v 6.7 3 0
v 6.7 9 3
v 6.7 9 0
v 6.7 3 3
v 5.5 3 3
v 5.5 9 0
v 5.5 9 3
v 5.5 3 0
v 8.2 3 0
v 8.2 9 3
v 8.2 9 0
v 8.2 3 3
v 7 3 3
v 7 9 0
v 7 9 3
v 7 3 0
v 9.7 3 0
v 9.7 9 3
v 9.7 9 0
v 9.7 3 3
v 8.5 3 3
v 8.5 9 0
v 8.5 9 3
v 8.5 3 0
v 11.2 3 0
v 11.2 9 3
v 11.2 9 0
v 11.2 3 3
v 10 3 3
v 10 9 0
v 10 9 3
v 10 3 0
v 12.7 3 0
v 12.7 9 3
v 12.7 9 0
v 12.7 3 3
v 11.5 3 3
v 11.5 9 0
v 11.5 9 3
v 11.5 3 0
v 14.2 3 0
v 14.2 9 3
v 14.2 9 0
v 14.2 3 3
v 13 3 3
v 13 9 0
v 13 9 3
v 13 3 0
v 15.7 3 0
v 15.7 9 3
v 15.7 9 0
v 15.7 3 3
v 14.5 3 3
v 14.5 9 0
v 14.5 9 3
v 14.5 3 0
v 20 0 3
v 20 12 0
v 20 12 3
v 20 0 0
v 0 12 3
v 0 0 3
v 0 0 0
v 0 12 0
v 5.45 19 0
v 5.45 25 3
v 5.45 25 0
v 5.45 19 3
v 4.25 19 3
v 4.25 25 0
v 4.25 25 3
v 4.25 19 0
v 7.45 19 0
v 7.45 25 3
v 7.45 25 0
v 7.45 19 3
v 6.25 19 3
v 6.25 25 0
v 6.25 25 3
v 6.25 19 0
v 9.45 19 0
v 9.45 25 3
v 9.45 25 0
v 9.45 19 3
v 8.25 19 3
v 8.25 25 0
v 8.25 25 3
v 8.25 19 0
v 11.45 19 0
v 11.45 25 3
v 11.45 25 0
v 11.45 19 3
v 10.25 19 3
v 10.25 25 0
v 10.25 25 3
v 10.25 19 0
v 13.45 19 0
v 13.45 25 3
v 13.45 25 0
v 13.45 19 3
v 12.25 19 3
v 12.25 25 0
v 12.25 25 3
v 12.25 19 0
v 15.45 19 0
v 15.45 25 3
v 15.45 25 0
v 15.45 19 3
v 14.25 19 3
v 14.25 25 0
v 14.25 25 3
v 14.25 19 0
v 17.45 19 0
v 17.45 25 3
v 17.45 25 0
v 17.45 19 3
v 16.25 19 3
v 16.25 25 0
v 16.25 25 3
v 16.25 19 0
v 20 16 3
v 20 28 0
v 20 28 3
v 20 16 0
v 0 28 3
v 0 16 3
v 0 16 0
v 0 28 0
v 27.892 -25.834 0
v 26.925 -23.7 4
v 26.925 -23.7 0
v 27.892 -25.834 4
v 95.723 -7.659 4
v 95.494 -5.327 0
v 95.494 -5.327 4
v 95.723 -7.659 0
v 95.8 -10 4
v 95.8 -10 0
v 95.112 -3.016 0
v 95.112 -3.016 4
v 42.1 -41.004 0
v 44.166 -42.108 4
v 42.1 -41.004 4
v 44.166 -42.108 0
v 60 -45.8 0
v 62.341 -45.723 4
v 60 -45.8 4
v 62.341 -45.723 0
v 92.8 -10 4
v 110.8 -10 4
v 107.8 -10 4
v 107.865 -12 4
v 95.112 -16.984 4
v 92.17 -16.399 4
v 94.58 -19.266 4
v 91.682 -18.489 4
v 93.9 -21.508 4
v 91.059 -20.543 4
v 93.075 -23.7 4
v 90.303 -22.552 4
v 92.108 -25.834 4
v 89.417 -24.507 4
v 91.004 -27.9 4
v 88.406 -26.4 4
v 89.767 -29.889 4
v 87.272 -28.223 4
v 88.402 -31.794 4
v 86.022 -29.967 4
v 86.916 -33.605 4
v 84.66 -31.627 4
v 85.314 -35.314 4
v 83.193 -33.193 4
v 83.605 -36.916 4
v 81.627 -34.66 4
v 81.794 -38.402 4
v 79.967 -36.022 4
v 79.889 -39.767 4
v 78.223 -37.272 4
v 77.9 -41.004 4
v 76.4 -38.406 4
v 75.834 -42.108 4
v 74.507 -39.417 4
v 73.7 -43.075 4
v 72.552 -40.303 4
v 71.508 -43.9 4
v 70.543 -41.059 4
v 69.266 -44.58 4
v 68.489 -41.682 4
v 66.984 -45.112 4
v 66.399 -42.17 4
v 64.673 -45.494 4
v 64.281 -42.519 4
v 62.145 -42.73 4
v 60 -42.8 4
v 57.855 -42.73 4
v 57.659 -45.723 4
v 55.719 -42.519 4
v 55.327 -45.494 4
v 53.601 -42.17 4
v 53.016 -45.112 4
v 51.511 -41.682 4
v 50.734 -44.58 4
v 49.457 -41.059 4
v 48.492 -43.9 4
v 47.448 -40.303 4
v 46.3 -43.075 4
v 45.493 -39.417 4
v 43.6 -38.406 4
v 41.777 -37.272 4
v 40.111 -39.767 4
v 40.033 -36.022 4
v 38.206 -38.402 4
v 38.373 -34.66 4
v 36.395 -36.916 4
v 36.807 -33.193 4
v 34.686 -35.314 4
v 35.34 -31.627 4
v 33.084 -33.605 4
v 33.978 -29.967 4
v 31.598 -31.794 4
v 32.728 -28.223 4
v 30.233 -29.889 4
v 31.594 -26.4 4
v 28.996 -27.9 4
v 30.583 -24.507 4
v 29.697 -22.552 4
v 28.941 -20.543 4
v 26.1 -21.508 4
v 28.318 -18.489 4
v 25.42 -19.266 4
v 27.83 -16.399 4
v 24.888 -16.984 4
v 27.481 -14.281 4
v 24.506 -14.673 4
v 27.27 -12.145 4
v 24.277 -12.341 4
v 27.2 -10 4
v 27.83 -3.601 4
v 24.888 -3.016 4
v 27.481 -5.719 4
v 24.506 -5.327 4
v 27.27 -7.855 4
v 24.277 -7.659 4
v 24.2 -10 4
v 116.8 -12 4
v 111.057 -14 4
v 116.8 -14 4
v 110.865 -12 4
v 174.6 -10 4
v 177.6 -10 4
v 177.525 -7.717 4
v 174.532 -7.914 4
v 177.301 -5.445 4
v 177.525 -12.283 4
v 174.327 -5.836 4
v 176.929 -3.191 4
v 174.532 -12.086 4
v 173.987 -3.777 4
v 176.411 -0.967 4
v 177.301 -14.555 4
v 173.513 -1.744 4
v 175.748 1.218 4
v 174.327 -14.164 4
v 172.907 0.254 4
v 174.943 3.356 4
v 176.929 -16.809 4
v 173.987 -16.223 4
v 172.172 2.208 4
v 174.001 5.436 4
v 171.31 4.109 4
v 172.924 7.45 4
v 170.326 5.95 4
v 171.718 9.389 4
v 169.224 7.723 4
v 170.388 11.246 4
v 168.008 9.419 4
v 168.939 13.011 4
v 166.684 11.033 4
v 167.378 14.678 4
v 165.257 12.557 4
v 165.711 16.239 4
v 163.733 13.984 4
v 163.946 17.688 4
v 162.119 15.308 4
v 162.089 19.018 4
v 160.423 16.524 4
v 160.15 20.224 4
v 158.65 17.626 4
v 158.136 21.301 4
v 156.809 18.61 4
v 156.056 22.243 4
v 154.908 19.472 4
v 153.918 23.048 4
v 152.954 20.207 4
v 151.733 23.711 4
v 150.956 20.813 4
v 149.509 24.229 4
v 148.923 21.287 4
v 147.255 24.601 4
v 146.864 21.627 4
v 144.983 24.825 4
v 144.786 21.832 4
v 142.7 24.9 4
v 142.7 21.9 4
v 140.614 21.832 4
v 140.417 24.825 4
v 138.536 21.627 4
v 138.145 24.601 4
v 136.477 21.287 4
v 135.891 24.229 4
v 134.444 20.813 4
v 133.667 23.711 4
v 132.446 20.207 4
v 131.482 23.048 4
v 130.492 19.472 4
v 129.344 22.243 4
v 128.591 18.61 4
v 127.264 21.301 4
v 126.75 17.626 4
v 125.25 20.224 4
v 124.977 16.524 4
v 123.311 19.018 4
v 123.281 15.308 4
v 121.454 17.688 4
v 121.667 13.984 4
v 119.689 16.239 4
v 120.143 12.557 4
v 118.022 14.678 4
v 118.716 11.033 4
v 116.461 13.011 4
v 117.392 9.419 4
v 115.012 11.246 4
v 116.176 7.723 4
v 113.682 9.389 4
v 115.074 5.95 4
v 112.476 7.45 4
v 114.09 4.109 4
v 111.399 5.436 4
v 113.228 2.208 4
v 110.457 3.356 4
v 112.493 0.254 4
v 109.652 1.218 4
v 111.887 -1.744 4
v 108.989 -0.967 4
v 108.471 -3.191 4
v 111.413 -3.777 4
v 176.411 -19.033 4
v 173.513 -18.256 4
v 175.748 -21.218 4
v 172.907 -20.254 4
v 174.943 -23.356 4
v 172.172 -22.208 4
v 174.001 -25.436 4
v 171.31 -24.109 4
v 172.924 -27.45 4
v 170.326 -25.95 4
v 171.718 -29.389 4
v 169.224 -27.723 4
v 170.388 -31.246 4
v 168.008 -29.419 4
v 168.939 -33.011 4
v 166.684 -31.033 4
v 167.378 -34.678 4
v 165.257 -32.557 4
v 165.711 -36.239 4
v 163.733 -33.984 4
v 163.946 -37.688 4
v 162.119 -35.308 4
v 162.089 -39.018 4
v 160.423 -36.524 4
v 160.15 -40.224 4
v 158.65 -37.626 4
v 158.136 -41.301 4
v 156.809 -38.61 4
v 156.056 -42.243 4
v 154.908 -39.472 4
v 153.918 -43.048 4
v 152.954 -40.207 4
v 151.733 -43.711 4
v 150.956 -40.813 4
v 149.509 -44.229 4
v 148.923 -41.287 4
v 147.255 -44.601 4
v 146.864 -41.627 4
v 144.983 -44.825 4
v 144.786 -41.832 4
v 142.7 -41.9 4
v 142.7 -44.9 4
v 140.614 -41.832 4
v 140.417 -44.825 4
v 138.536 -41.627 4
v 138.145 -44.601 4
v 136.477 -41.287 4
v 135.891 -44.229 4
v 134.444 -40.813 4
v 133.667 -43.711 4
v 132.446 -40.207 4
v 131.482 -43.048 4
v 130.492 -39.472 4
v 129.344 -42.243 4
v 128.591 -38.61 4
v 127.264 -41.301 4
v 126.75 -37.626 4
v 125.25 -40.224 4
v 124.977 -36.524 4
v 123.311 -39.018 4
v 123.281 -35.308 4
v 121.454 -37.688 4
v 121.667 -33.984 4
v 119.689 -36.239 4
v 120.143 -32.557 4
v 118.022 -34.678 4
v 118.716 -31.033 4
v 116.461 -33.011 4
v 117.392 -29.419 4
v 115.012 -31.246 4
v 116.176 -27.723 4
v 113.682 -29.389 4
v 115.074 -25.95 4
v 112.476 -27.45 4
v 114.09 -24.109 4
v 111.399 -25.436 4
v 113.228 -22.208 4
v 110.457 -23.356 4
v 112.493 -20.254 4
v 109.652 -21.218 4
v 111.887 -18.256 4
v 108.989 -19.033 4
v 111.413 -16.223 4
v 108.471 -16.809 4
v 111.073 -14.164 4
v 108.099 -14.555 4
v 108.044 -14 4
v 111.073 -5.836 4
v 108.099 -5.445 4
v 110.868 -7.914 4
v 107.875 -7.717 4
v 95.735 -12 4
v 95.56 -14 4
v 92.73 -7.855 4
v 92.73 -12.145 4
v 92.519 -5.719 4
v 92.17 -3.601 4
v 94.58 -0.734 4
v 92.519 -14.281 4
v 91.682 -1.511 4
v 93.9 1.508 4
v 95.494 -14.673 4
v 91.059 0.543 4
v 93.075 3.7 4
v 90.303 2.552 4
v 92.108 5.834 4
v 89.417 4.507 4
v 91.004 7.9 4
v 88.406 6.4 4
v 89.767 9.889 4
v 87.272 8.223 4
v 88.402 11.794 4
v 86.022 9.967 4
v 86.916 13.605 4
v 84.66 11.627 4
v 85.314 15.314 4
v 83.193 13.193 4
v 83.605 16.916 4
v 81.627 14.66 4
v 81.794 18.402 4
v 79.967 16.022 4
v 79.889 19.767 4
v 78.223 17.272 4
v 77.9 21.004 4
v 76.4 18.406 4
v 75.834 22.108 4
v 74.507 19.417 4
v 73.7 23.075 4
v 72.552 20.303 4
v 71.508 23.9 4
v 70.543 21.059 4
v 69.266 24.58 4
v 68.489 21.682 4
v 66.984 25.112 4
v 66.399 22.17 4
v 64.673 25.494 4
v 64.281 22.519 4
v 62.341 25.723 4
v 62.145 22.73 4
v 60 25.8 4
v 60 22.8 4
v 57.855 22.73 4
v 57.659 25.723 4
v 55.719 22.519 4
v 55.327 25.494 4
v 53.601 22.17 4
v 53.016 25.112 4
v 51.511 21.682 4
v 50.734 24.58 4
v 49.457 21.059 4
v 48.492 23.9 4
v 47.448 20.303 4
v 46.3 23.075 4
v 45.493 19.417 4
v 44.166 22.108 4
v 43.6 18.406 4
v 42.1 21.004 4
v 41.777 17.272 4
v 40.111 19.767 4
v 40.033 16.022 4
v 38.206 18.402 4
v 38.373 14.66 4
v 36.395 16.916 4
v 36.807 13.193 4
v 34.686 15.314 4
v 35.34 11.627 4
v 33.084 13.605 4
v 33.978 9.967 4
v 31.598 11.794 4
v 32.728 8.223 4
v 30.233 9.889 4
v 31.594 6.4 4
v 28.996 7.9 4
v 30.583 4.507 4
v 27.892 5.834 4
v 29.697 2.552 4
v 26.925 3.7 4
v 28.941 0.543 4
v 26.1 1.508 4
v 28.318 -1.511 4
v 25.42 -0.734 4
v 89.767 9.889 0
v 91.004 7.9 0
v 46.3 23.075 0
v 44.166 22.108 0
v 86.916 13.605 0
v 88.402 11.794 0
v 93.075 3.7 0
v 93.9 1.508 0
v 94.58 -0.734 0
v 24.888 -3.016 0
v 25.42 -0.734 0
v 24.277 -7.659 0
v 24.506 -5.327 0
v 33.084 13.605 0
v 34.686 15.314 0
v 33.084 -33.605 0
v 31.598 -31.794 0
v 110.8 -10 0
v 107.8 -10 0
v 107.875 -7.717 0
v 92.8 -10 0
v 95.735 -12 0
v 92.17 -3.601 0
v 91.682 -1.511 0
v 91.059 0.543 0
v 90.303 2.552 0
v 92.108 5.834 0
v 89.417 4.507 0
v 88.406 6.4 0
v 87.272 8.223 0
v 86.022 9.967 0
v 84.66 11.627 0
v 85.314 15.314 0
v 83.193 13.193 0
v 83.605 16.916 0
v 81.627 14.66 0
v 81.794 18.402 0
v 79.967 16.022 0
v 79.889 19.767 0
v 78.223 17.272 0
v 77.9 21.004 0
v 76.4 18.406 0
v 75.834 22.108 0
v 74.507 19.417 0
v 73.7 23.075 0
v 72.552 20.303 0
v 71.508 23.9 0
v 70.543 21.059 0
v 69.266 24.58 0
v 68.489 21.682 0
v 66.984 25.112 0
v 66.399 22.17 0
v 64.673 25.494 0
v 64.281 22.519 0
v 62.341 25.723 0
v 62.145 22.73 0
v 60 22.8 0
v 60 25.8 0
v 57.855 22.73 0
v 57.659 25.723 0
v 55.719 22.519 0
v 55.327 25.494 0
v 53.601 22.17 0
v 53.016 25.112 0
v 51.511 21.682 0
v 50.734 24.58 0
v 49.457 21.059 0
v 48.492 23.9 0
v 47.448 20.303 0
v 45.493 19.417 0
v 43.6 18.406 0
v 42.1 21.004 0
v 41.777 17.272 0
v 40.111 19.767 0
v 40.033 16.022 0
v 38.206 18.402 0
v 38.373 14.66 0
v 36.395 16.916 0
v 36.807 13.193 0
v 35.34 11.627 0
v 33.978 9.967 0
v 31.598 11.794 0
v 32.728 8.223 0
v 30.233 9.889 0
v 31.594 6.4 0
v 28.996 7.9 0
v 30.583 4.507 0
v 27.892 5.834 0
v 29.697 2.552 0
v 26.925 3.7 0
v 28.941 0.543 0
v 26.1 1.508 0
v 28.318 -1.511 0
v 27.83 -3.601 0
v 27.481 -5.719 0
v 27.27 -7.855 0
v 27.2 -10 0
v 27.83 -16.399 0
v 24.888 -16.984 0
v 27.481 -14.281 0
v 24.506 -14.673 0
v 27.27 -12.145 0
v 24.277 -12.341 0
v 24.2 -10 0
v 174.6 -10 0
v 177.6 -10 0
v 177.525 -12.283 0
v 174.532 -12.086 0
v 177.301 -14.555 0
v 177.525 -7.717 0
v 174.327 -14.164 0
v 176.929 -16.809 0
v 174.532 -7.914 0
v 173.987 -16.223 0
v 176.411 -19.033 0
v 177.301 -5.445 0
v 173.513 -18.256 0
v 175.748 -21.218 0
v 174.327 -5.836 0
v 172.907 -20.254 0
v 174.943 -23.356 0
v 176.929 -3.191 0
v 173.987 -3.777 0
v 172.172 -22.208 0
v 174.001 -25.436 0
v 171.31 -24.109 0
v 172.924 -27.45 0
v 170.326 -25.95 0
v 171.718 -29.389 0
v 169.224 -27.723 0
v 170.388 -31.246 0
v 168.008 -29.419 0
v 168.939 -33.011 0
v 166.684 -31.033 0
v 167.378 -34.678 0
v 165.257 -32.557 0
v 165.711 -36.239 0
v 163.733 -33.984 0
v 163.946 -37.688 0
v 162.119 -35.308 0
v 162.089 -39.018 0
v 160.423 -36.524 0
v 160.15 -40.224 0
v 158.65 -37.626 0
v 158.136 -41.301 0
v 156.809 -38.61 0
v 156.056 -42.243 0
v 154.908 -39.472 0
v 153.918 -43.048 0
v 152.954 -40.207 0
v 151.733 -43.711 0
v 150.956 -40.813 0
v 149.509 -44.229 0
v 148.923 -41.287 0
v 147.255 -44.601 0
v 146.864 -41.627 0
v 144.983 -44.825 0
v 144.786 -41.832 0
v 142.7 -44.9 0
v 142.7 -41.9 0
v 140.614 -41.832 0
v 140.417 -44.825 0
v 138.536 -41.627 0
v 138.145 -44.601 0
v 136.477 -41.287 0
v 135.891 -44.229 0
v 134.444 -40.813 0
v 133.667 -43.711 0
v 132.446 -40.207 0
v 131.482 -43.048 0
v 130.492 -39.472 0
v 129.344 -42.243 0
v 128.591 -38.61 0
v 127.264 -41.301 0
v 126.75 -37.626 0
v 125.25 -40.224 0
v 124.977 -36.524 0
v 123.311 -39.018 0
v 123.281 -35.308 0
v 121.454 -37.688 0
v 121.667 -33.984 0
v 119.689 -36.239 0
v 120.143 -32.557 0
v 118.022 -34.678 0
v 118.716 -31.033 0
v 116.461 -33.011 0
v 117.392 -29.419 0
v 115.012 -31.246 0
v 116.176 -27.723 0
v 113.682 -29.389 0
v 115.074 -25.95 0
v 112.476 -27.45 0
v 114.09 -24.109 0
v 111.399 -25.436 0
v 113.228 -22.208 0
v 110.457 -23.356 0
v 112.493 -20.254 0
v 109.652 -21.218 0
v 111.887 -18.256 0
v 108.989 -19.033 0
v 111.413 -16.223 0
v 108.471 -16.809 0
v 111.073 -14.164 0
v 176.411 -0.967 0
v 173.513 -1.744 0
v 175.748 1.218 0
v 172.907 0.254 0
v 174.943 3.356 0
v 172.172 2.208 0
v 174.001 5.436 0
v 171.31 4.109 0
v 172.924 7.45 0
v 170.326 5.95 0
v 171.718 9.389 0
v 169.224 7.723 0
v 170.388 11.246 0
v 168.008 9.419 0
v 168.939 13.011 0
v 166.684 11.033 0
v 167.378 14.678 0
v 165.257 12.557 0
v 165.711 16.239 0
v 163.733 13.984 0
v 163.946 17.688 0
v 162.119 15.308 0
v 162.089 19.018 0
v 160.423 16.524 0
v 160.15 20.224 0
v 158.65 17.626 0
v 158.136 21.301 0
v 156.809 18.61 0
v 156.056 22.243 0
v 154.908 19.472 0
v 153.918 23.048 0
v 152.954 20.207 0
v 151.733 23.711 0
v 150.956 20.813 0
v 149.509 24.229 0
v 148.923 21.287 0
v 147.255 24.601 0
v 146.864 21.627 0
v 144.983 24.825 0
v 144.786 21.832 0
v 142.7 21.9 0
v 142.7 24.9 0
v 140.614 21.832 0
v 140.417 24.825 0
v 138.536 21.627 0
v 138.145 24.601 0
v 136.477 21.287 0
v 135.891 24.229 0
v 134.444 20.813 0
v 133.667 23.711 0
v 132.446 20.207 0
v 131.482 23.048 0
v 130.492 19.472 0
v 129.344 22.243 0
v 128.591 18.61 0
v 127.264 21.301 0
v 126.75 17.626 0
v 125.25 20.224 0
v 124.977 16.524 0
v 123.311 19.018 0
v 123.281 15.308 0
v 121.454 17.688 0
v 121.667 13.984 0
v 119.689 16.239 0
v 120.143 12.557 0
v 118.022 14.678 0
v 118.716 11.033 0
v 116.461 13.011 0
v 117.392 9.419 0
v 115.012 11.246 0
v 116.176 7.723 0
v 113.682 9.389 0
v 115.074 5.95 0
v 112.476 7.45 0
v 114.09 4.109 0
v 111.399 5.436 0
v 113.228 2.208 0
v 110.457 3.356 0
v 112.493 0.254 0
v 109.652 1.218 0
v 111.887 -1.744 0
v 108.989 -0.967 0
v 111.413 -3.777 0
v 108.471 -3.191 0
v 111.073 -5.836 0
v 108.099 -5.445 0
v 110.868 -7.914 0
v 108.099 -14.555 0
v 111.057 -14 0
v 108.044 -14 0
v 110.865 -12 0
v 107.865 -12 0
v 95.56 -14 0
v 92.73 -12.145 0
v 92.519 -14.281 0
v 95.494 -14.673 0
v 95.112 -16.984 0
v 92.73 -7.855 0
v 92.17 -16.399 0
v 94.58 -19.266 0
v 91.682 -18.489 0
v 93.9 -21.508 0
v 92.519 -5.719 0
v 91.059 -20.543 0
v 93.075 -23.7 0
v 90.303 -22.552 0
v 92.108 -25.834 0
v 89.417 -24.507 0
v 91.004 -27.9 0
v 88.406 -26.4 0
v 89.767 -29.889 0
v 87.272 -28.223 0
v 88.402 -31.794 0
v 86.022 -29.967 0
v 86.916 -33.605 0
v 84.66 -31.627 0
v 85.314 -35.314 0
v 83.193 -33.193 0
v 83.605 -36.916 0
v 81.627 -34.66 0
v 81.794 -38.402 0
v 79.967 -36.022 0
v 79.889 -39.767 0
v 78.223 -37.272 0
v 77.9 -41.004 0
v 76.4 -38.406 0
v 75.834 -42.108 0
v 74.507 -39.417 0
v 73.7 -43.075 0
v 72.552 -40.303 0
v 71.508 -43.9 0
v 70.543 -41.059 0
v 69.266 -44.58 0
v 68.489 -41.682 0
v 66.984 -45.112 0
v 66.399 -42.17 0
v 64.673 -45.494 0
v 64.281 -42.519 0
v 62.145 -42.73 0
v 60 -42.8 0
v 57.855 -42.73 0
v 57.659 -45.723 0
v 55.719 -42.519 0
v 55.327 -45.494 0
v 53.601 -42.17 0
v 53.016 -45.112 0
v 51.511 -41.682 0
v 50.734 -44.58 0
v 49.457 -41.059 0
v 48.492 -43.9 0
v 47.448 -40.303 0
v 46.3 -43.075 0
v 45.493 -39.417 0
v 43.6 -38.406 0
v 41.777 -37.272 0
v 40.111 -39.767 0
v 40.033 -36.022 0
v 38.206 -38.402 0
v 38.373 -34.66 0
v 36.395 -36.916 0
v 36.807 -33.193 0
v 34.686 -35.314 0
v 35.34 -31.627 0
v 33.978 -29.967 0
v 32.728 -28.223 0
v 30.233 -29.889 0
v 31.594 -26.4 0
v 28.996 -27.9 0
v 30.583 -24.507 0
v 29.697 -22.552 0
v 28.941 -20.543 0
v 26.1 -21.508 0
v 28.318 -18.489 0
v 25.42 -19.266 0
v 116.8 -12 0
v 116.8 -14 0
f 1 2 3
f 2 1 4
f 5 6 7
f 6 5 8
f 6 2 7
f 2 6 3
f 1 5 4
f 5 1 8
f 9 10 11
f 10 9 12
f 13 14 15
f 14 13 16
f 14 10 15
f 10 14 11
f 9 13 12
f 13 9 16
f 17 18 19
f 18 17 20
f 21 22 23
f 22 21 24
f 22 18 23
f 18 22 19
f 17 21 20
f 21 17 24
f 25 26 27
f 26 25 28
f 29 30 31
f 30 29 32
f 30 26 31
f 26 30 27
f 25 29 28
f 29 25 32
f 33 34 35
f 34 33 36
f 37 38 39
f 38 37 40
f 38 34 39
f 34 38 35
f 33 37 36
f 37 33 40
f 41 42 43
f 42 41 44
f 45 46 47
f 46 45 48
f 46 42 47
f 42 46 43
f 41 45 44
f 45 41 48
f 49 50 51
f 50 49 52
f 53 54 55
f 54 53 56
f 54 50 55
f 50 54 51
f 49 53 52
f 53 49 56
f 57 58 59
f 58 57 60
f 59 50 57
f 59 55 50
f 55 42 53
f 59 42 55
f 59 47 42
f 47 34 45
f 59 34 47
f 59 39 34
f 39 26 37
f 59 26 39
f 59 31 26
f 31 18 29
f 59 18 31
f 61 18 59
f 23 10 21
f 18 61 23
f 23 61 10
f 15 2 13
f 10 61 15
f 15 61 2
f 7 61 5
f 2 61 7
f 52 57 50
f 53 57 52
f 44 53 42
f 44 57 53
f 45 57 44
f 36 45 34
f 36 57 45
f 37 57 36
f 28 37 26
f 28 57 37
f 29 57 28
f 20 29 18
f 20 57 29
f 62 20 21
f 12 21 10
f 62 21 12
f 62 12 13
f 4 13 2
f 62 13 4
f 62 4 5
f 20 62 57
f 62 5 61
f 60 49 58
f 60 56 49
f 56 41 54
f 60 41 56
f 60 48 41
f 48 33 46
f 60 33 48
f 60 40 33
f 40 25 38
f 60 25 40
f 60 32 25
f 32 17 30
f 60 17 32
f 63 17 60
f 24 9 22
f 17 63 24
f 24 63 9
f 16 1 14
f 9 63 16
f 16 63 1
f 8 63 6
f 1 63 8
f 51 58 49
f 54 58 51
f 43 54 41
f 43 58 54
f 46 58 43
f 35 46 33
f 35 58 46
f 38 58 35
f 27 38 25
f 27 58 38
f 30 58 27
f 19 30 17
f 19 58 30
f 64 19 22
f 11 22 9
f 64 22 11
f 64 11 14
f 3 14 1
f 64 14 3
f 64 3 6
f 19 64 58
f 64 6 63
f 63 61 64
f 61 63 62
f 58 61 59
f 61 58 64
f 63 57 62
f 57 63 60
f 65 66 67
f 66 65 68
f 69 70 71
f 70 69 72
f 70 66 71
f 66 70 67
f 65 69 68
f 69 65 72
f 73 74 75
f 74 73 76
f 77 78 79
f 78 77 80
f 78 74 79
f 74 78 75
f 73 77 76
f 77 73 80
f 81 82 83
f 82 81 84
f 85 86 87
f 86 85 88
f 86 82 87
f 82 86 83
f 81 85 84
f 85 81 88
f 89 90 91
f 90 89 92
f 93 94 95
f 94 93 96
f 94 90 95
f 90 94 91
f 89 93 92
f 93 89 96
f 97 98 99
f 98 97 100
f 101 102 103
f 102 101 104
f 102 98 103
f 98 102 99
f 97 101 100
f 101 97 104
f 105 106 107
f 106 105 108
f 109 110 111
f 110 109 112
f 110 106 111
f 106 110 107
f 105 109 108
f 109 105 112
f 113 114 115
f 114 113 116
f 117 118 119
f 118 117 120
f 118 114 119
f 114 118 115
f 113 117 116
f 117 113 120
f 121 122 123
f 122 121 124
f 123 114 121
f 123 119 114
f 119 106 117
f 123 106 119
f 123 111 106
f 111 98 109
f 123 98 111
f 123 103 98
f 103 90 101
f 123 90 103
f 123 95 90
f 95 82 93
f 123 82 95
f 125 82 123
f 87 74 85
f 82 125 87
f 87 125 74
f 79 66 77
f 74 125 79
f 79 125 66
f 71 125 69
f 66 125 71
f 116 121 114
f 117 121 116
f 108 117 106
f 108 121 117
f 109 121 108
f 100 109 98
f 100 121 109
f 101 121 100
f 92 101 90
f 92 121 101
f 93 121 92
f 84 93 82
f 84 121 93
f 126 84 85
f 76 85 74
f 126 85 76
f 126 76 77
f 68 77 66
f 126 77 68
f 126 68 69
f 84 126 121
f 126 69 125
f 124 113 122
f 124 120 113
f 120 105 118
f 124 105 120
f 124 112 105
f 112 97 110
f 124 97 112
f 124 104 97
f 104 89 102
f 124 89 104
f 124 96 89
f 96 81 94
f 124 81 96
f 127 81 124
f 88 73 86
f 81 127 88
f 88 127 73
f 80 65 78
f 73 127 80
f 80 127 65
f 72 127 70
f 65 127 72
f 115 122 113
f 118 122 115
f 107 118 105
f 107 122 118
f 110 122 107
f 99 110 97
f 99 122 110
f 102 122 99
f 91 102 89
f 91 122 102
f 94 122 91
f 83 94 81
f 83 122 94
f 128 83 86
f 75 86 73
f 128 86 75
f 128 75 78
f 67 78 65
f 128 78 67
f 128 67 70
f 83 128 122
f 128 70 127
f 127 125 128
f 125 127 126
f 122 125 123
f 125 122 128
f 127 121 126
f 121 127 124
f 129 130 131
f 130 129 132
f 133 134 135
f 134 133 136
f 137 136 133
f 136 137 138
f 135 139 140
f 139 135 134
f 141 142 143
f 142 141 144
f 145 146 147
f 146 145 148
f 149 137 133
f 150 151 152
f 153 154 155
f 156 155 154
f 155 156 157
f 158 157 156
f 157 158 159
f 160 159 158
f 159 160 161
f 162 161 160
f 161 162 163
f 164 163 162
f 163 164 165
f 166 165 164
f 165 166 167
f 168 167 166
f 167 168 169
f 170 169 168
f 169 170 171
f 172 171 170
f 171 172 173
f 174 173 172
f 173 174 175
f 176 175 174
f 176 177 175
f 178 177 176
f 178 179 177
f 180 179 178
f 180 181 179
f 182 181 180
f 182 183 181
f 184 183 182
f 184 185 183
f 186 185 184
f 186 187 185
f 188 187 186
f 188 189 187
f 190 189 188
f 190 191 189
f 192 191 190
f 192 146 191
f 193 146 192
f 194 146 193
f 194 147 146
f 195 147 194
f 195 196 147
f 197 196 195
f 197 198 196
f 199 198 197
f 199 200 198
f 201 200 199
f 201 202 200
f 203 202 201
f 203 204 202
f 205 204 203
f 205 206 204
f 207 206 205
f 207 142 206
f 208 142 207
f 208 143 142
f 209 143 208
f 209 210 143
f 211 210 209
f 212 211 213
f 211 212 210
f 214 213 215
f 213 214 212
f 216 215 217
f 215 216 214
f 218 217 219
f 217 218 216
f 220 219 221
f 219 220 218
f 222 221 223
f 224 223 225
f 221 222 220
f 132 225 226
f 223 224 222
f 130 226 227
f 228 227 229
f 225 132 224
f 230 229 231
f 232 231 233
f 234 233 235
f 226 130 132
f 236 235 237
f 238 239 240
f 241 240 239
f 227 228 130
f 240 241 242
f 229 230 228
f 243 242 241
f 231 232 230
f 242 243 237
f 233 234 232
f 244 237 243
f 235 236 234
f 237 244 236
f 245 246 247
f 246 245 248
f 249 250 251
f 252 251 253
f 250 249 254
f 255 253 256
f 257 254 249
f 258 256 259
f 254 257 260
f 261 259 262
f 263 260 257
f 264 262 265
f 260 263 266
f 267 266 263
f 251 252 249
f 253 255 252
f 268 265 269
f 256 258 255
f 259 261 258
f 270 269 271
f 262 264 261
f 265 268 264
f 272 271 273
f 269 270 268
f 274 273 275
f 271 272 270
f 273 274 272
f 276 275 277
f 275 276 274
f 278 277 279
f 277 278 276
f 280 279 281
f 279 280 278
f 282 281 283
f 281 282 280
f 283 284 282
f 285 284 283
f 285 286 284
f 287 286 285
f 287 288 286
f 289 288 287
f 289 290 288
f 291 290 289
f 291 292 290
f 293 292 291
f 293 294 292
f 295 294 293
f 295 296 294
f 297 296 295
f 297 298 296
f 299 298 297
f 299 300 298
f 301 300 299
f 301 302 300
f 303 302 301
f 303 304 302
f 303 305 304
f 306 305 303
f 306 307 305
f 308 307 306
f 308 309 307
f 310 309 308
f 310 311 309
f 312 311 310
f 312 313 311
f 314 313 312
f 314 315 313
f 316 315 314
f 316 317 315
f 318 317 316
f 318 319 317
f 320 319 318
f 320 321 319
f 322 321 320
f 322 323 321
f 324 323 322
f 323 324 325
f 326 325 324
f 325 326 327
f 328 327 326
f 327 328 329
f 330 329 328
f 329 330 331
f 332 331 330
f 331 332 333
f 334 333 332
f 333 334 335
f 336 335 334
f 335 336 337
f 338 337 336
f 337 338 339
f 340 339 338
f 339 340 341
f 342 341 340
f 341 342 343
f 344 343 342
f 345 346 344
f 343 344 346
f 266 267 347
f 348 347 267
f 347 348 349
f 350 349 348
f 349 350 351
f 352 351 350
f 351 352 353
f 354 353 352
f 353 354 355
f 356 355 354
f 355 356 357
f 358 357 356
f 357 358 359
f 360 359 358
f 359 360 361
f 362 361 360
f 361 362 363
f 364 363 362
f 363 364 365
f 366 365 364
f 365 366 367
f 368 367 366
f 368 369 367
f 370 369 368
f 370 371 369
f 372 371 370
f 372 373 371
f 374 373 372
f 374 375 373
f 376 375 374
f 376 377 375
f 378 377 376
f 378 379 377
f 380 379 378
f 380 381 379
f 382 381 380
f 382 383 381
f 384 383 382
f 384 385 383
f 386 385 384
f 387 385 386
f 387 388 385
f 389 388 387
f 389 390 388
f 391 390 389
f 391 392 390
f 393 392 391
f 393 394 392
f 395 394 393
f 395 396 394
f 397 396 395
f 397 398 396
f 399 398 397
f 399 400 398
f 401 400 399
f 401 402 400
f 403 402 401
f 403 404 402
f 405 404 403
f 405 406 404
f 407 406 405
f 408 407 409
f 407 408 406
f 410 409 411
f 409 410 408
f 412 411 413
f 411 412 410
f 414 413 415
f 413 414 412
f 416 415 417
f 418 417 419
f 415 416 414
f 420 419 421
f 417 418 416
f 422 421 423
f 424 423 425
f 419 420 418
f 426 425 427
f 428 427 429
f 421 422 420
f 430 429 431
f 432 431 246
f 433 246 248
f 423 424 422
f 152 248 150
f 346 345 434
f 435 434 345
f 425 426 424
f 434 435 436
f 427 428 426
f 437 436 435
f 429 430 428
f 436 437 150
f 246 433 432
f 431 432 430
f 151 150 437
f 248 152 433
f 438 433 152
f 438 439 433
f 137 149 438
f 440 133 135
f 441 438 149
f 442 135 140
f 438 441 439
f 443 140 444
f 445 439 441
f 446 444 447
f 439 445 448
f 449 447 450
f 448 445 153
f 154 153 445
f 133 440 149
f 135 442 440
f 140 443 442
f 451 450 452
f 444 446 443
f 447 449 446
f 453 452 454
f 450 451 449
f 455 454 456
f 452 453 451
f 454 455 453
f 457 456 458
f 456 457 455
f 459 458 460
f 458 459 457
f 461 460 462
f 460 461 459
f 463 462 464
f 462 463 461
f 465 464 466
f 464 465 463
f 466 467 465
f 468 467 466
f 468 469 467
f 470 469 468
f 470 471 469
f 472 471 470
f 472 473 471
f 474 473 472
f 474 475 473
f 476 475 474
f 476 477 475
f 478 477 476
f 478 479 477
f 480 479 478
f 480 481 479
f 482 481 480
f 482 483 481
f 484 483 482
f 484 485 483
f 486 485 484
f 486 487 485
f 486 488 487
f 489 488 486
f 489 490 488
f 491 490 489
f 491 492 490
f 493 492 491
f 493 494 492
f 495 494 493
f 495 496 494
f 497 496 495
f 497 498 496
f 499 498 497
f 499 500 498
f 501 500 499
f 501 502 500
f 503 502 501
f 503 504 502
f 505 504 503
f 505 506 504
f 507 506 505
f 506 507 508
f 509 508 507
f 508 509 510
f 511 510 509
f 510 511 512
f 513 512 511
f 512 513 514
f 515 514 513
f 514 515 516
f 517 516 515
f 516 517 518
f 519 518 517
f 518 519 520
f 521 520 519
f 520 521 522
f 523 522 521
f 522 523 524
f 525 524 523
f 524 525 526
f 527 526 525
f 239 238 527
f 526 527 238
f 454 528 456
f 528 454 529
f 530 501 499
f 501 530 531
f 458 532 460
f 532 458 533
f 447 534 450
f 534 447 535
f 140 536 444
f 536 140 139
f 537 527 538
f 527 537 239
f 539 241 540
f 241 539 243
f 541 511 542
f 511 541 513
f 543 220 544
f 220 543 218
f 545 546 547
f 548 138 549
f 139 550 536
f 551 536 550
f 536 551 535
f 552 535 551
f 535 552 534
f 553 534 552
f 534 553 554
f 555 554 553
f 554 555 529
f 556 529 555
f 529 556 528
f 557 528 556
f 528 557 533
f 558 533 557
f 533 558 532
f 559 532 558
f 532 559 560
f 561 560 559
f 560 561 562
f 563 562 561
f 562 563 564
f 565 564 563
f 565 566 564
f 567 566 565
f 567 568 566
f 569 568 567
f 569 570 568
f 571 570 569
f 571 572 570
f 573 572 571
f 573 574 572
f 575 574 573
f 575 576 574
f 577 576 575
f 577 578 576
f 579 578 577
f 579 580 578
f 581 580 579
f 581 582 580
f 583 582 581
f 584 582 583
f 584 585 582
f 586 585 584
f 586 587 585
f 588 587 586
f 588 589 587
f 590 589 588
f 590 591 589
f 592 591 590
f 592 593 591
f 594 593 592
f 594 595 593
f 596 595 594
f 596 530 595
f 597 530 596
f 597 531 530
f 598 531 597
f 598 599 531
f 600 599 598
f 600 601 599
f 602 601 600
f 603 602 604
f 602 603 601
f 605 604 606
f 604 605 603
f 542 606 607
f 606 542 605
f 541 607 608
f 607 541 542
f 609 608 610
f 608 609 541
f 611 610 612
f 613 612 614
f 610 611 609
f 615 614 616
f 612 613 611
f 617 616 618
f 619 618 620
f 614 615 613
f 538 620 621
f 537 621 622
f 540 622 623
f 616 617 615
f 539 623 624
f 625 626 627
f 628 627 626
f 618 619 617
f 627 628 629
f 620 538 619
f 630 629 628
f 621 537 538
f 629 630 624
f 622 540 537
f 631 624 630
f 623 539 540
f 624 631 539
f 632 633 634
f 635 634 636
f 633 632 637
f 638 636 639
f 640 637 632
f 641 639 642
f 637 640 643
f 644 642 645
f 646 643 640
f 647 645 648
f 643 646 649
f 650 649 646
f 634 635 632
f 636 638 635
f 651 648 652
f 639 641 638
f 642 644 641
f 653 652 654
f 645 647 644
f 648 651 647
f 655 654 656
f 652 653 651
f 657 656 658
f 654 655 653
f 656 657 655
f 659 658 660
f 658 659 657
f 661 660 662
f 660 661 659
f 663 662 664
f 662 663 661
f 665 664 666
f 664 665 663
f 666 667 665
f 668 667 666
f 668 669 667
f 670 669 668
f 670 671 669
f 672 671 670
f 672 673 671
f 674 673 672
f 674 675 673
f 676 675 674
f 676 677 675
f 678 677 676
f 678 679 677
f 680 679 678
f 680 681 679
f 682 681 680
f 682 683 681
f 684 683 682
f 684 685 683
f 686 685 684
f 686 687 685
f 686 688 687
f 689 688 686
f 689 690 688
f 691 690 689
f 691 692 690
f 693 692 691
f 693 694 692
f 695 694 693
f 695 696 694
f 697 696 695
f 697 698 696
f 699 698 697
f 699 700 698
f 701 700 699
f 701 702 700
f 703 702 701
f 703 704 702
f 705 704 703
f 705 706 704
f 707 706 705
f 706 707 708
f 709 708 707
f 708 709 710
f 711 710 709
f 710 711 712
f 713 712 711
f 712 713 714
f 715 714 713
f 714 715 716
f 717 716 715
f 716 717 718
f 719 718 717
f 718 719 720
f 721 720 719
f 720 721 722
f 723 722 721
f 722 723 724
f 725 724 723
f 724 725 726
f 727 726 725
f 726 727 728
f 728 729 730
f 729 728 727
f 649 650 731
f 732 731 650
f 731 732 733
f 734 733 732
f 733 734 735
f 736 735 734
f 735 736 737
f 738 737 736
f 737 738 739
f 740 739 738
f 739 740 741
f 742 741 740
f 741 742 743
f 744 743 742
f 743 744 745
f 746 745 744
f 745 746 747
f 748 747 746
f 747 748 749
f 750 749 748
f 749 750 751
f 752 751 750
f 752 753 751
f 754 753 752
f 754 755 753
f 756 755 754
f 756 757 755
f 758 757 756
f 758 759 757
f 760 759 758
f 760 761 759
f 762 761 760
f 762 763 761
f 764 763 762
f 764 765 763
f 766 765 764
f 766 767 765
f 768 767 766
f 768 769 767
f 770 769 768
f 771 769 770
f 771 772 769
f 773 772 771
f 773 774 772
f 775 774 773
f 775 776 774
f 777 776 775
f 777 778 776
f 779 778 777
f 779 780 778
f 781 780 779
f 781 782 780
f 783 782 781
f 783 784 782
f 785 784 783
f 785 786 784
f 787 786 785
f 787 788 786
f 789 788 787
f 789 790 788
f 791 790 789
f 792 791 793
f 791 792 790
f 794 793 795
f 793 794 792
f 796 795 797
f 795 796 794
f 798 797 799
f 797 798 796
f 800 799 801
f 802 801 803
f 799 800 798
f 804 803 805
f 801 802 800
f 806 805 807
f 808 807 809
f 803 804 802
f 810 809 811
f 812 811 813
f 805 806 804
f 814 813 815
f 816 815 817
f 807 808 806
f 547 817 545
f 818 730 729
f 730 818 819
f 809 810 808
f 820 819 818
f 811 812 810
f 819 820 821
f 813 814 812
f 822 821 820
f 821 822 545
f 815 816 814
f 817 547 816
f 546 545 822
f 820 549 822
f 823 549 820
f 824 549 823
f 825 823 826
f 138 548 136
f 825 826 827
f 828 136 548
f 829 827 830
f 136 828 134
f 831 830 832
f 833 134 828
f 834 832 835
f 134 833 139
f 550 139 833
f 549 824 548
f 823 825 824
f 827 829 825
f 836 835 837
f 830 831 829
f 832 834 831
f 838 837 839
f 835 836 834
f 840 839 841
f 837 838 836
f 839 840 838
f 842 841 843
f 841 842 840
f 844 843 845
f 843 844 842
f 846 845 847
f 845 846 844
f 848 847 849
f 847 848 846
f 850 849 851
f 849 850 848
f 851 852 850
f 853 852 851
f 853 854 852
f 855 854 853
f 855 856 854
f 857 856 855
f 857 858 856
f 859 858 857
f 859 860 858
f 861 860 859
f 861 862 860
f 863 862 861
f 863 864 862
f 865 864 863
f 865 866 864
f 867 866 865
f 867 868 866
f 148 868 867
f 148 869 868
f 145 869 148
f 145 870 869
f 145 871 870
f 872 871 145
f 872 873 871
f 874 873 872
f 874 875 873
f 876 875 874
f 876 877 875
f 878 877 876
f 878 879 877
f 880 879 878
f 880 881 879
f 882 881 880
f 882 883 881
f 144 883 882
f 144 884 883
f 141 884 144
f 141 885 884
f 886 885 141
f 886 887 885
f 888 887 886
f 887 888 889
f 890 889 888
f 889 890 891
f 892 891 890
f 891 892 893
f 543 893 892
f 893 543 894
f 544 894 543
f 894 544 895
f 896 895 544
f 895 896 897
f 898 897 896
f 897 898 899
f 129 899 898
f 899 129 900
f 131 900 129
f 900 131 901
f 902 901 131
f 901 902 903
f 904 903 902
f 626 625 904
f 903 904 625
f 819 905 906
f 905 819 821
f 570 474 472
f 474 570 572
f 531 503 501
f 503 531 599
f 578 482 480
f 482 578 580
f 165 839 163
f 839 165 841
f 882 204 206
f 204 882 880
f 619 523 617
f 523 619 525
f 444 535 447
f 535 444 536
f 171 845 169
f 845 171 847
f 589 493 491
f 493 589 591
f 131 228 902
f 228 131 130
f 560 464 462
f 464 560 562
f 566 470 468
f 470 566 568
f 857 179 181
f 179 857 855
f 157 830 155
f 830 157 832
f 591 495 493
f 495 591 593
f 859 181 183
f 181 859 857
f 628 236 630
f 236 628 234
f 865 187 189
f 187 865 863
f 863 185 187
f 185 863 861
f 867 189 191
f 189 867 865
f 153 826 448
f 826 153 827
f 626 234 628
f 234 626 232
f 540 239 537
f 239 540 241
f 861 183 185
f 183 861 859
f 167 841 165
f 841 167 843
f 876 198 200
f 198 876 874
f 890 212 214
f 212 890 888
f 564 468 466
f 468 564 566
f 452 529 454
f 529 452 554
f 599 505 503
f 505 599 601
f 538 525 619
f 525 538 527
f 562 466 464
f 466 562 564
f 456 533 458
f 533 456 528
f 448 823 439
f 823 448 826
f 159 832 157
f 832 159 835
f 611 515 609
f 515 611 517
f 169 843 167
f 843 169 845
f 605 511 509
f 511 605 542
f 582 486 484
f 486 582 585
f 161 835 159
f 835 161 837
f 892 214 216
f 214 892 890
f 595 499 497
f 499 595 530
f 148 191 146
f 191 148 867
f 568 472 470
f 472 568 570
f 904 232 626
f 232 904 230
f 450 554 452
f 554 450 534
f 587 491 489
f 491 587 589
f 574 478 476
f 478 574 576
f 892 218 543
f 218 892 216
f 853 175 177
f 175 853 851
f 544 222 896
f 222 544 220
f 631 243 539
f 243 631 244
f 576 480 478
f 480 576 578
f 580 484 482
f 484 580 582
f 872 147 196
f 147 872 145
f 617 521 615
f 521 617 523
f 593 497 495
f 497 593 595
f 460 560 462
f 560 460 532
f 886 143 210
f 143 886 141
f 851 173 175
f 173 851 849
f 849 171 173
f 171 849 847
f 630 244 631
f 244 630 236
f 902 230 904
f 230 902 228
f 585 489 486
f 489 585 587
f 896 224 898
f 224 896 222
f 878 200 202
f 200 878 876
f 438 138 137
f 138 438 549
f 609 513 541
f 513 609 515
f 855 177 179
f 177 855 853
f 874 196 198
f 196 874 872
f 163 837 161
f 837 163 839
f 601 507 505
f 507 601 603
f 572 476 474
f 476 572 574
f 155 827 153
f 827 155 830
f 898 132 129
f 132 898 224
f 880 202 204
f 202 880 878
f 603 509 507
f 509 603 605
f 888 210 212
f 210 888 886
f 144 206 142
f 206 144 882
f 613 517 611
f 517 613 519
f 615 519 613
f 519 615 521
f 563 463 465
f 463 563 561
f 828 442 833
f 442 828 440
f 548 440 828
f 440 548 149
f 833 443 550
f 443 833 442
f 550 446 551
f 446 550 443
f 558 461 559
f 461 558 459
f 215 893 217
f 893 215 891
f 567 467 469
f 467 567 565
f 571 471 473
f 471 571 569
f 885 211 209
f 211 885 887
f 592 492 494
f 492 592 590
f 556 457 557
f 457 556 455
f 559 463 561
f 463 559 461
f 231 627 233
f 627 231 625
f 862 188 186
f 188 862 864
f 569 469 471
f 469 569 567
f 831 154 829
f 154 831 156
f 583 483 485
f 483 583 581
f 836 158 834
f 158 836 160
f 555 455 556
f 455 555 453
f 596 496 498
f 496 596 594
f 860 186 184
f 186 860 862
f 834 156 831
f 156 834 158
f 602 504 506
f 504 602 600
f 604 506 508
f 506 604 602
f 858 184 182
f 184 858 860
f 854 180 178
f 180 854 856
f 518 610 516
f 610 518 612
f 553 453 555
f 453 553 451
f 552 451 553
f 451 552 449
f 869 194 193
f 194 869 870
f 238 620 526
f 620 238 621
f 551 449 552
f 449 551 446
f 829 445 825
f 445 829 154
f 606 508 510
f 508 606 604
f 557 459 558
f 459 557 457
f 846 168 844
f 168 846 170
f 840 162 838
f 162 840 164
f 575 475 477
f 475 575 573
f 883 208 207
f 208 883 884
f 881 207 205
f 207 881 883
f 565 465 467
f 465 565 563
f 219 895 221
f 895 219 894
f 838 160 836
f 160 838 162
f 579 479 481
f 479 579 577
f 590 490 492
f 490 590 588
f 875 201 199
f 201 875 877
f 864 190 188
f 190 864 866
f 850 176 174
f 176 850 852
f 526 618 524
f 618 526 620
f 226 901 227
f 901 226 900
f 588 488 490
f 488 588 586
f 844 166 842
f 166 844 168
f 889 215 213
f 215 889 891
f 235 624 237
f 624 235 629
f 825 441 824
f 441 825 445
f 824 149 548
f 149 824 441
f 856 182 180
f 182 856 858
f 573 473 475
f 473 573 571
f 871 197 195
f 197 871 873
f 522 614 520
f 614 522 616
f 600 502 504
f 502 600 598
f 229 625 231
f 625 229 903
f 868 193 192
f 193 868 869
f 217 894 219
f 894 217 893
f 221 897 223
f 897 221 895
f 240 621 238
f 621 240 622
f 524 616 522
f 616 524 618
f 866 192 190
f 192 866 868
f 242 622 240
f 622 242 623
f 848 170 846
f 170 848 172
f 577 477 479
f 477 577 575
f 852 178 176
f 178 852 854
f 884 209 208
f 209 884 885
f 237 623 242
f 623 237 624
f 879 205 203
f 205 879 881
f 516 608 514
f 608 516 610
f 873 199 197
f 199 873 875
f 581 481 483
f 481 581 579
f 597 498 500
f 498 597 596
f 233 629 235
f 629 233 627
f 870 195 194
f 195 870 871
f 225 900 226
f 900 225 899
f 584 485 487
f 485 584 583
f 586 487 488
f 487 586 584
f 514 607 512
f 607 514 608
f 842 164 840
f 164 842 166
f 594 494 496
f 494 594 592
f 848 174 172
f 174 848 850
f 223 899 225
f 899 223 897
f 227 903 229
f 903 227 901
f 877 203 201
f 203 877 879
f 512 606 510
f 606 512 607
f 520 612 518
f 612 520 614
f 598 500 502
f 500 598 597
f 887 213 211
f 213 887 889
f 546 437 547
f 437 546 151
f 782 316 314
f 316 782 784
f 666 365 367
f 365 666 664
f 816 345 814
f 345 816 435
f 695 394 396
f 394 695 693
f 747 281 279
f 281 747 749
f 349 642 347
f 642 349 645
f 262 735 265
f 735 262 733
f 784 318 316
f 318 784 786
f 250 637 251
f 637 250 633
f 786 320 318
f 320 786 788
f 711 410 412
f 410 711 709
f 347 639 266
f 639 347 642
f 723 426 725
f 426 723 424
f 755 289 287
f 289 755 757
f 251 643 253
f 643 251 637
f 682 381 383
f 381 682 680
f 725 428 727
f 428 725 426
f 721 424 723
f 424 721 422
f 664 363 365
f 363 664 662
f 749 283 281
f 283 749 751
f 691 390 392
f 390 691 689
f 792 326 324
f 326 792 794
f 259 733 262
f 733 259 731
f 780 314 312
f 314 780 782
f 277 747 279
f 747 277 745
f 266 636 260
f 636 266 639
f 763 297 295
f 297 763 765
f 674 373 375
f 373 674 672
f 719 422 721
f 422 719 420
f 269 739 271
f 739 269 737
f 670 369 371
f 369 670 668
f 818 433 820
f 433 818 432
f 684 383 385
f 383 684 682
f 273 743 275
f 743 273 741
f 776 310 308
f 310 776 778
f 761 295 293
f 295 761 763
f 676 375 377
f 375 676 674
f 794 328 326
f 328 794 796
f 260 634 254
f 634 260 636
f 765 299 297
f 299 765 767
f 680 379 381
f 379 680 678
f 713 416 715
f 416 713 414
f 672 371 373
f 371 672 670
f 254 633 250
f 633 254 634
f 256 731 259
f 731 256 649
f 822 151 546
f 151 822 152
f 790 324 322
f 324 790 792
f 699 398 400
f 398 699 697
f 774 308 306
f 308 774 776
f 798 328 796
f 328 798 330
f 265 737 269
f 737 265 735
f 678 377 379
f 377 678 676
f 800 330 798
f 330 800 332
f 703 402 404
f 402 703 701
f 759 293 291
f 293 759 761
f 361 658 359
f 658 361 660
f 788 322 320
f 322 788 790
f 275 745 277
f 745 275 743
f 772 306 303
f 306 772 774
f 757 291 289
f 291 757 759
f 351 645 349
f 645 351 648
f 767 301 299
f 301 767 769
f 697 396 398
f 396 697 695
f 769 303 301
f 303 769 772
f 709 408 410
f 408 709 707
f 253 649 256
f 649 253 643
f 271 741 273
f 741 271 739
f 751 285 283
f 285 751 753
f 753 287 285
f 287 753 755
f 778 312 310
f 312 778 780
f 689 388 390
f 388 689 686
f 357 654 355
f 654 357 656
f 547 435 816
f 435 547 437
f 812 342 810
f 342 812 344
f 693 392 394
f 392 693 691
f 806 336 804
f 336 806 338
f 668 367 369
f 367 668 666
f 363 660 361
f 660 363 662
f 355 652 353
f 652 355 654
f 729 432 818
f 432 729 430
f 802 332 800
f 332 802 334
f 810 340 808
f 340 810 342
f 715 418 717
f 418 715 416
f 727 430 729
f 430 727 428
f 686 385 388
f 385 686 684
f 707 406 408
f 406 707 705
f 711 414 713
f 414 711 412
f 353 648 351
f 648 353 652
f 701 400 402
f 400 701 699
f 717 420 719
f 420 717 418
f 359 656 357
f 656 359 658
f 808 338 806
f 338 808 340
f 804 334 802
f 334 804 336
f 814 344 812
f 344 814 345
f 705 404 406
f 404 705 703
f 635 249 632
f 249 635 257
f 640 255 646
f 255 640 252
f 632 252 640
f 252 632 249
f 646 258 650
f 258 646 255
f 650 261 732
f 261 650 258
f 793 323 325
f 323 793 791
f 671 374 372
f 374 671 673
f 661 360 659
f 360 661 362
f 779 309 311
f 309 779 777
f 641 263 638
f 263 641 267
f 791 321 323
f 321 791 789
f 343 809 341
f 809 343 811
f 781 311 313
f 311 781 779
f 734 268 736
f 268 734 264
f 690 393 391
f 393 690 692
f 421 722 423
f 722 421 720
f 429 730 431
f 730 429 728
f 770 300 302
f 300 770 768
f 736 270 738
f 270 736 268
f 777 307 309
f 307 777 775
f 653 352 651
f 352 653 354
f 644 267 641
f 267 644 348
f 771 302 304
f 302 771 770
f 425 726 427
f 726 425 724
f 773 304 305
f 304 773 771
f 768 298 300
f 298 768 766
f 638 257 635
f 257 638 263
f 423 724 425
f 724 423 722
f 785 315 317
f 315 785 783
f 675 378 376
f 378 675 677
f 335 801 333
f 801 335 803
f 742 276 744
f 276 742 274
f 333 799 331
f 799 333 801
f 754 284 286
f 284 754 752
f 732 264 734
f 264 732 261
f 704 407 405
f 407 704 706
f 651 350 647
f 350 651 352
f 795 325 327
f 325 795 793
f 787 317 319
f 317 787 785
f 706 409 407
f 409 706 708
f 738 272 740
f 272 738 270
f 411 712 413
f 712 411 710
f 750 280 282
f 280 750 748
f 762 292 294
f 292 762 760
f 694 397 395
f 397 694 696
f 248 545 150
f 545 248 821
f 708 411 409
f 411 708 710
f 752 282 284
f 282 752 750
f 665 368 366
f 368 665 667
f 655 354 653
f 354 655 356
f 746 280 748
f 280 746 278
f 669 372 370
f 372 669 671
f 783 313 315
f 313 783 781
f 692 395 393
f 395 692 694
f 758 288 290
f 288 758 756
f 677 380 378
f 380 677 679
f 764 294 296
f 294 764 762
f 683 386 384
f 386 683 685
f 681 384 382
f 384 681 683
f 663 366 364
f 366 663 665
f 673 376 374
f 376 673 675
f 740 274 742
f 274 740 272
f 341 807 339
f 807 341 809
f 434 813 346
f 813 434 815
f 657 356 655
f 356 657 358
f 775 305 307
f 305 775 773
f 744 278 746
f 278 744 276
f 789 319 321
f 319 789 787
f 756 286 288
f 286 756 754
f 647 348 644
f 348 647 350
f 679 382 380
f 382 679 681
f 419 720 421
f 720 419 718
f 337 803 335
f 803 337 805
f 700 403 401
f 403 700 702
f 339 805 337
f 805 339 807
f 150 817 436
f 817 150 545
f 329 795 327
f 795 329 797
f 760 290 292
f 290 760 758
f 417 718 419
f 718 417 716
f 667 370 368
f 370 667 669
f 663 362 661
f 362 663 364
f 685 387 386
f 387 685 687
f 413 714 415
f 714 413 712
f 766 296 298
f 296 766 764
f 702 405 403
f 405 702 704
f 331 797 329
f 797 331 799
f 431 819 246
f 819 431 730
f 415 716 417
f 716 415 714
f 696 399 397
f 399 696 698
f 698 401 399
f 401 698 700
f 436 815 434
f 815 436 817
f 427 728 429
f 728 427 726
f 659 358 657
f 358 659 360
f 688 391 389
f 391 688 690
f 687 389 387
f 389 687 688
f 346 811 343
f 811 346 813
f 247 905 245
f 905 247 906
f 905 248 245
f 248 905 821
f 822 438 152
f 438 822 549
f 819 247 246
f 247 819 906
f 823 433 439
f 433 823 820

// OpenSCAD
// Printable gauges: drive-wheel harness plug pitch + dock-fan class rings
// ========================================================================
// Jigs 22 and 23 for PRINT-TEST.md. Two quick go/no-go checks for parts in
// this module's BOM set, before any caliper time is spent.
//
// Provenance tags: [M] = measured, from a fetched/citable source (named
// inline). [S] = published series standard (JST catalog dimension).
// [E] = (estimate) on this jig's own geometry — the jig's only job is the
// pass/fail feel, so jig body dims matter less than the gauge IDs/pitches.

// ---------------------------------------------------------------
// Jig 22 -- 7-conductor plug pitch gauge, drive-wheel harness
// ---------------------------------------------------------------
// IKsares measured the module end: 7 conductors, 1.5 mm pitch
// (9.0 mm pin1..pin7 centre-to-centre / 6) -> JST ZH family,pitch
// confirmed but brand unmarked. part-specs/IKsares/drive-wheel
// README.md section 2, merged upstream (PR #61). [M]
//
// The gauge is the on-bench re-confirmation and the discriminator
// against the neighbouring JST families: the same 7-wide plug is
// offered slots at ZH 1.5 [S] and PH 2.0 [S] pitch -- the correct
// family drops in, the wrong one does not reach the row ends.
//
// Slot grid: 7 slots, width 1.0 + 0.2 print margin [E], depth 6 [E].

gauge_slot_pitch = 1.5;   // [S] JST ZH series
gauge_alt_pitch  = 2.0;   // [S] JST PH series (the "might be XH"舍 candidate at 2.5 was ruled out upstream; PH is the nearest neighbour worth ruling out physically)
slots            = 7;     // [M] conductor count
slot_w           = 1.2;   // [E] 1.0 pin + ~0.2 clearance
slot_depth       = 6.0;   // [E]
plate_t          = 3.0;   // [E]

module pitch_row(p, label_h) {
    for (i = [0:slots-1])
        translate([(i - (slots-1)/2) * p, 0, 0])
            cube([slot_w, slot_depth, plate_t + 0.6], center = false);
}

module plug_gauge() {
    difference() {
        cube([slots * 2.0 + 6, slot_depth + 6, plate_t]);   // [E] carrier
        // ZH row, offset 3 mm from plate edge, embedded mid-plate
        translate([3 + slots * 1.0, 3, -0.1]) pitch_row(gauge_slot_pitch, "ZH1.5");
    }
    // second plate: PH 2.0 row as the wrong-pitch control
    translate([0, slot_depth + 10, 0]) difference() {
        cube([slots * 2.0 + 6, slot_depth + 6, plate_t]);
        translate([3 + slots * 1.0 + 0.25, 3, -0.1])
            pitch_row(gauge_alt_pitch, "PH2.0");
    }
}
// PLUG-GAUGE USE: harness plug pins must fully seat the ZH row; the same
// plug on the PH row should perch visibly proud. If BOTH rows fail, the
// plug is XH 2.5 class -> escalate to calipers (upstream ruled XH out on
// the 9.0/6 arithmetic; a both-fail means the assumption chain broke).

// ---------------------------------------------------------------
// Jig 23 -- dock auto-empty fan: 65 mm class ring pair
// ---------------------------------------------------------------
// BOM.md (upstream main, row "Auto-empty suction fan") specifies the
// class "21.6-25.2 V 65 mm 350 W". [M from BOM.md, read 2026-09-06]
// Ring pair = one-minute incoming check that a bought fan is the
// declared 65-class before it goes near MEASURE-ME section 20.
//   ring A GO : bore 65.6 [E = 65 +0.6 shrink/mark allowance] -- fan must pass
//   ring B MIN: bore 63.8 [E window] -- passing BOTH means the fan is
//               under 63.8 -> not a 65-class part, re-check the listing
// Rings are outline walls only; fan blades/housing may touch any wall.

ring_go_d   = 65.6;   // [E]
ring_min_d  = 63.8;   // [E]
ring_wall   = 3.0;    // [E]
ring_t      = 4.0;    // [E]

module ring(d) {
    difference() {
        cylinder(d = d + 2*ring_wall, h = ring_t, $fn = 96);
        translate([0, 0, -0.1]) cylinder(d = d, h = ring_t + 0.2, $fn = 96);
    }
}

module fan_class_gauge() {
    ring(ring_go_d);
    translate([ring_go_d/2 + ring_wall + 12 + ring_min_d/2 + ring_wall, 0, 0]) ring(ring_min_d);
    // connecting bar labelled by shape: chamfered end = MIN ring side
    translate([ring_go_d/2, -ring_wall - 1, 0])
        cube([24, 2, ring_t]);
}

// side-by-side print layout (one plate)
plug_gauge();
translate([60, -10, 0]) fan_class_gauge();
